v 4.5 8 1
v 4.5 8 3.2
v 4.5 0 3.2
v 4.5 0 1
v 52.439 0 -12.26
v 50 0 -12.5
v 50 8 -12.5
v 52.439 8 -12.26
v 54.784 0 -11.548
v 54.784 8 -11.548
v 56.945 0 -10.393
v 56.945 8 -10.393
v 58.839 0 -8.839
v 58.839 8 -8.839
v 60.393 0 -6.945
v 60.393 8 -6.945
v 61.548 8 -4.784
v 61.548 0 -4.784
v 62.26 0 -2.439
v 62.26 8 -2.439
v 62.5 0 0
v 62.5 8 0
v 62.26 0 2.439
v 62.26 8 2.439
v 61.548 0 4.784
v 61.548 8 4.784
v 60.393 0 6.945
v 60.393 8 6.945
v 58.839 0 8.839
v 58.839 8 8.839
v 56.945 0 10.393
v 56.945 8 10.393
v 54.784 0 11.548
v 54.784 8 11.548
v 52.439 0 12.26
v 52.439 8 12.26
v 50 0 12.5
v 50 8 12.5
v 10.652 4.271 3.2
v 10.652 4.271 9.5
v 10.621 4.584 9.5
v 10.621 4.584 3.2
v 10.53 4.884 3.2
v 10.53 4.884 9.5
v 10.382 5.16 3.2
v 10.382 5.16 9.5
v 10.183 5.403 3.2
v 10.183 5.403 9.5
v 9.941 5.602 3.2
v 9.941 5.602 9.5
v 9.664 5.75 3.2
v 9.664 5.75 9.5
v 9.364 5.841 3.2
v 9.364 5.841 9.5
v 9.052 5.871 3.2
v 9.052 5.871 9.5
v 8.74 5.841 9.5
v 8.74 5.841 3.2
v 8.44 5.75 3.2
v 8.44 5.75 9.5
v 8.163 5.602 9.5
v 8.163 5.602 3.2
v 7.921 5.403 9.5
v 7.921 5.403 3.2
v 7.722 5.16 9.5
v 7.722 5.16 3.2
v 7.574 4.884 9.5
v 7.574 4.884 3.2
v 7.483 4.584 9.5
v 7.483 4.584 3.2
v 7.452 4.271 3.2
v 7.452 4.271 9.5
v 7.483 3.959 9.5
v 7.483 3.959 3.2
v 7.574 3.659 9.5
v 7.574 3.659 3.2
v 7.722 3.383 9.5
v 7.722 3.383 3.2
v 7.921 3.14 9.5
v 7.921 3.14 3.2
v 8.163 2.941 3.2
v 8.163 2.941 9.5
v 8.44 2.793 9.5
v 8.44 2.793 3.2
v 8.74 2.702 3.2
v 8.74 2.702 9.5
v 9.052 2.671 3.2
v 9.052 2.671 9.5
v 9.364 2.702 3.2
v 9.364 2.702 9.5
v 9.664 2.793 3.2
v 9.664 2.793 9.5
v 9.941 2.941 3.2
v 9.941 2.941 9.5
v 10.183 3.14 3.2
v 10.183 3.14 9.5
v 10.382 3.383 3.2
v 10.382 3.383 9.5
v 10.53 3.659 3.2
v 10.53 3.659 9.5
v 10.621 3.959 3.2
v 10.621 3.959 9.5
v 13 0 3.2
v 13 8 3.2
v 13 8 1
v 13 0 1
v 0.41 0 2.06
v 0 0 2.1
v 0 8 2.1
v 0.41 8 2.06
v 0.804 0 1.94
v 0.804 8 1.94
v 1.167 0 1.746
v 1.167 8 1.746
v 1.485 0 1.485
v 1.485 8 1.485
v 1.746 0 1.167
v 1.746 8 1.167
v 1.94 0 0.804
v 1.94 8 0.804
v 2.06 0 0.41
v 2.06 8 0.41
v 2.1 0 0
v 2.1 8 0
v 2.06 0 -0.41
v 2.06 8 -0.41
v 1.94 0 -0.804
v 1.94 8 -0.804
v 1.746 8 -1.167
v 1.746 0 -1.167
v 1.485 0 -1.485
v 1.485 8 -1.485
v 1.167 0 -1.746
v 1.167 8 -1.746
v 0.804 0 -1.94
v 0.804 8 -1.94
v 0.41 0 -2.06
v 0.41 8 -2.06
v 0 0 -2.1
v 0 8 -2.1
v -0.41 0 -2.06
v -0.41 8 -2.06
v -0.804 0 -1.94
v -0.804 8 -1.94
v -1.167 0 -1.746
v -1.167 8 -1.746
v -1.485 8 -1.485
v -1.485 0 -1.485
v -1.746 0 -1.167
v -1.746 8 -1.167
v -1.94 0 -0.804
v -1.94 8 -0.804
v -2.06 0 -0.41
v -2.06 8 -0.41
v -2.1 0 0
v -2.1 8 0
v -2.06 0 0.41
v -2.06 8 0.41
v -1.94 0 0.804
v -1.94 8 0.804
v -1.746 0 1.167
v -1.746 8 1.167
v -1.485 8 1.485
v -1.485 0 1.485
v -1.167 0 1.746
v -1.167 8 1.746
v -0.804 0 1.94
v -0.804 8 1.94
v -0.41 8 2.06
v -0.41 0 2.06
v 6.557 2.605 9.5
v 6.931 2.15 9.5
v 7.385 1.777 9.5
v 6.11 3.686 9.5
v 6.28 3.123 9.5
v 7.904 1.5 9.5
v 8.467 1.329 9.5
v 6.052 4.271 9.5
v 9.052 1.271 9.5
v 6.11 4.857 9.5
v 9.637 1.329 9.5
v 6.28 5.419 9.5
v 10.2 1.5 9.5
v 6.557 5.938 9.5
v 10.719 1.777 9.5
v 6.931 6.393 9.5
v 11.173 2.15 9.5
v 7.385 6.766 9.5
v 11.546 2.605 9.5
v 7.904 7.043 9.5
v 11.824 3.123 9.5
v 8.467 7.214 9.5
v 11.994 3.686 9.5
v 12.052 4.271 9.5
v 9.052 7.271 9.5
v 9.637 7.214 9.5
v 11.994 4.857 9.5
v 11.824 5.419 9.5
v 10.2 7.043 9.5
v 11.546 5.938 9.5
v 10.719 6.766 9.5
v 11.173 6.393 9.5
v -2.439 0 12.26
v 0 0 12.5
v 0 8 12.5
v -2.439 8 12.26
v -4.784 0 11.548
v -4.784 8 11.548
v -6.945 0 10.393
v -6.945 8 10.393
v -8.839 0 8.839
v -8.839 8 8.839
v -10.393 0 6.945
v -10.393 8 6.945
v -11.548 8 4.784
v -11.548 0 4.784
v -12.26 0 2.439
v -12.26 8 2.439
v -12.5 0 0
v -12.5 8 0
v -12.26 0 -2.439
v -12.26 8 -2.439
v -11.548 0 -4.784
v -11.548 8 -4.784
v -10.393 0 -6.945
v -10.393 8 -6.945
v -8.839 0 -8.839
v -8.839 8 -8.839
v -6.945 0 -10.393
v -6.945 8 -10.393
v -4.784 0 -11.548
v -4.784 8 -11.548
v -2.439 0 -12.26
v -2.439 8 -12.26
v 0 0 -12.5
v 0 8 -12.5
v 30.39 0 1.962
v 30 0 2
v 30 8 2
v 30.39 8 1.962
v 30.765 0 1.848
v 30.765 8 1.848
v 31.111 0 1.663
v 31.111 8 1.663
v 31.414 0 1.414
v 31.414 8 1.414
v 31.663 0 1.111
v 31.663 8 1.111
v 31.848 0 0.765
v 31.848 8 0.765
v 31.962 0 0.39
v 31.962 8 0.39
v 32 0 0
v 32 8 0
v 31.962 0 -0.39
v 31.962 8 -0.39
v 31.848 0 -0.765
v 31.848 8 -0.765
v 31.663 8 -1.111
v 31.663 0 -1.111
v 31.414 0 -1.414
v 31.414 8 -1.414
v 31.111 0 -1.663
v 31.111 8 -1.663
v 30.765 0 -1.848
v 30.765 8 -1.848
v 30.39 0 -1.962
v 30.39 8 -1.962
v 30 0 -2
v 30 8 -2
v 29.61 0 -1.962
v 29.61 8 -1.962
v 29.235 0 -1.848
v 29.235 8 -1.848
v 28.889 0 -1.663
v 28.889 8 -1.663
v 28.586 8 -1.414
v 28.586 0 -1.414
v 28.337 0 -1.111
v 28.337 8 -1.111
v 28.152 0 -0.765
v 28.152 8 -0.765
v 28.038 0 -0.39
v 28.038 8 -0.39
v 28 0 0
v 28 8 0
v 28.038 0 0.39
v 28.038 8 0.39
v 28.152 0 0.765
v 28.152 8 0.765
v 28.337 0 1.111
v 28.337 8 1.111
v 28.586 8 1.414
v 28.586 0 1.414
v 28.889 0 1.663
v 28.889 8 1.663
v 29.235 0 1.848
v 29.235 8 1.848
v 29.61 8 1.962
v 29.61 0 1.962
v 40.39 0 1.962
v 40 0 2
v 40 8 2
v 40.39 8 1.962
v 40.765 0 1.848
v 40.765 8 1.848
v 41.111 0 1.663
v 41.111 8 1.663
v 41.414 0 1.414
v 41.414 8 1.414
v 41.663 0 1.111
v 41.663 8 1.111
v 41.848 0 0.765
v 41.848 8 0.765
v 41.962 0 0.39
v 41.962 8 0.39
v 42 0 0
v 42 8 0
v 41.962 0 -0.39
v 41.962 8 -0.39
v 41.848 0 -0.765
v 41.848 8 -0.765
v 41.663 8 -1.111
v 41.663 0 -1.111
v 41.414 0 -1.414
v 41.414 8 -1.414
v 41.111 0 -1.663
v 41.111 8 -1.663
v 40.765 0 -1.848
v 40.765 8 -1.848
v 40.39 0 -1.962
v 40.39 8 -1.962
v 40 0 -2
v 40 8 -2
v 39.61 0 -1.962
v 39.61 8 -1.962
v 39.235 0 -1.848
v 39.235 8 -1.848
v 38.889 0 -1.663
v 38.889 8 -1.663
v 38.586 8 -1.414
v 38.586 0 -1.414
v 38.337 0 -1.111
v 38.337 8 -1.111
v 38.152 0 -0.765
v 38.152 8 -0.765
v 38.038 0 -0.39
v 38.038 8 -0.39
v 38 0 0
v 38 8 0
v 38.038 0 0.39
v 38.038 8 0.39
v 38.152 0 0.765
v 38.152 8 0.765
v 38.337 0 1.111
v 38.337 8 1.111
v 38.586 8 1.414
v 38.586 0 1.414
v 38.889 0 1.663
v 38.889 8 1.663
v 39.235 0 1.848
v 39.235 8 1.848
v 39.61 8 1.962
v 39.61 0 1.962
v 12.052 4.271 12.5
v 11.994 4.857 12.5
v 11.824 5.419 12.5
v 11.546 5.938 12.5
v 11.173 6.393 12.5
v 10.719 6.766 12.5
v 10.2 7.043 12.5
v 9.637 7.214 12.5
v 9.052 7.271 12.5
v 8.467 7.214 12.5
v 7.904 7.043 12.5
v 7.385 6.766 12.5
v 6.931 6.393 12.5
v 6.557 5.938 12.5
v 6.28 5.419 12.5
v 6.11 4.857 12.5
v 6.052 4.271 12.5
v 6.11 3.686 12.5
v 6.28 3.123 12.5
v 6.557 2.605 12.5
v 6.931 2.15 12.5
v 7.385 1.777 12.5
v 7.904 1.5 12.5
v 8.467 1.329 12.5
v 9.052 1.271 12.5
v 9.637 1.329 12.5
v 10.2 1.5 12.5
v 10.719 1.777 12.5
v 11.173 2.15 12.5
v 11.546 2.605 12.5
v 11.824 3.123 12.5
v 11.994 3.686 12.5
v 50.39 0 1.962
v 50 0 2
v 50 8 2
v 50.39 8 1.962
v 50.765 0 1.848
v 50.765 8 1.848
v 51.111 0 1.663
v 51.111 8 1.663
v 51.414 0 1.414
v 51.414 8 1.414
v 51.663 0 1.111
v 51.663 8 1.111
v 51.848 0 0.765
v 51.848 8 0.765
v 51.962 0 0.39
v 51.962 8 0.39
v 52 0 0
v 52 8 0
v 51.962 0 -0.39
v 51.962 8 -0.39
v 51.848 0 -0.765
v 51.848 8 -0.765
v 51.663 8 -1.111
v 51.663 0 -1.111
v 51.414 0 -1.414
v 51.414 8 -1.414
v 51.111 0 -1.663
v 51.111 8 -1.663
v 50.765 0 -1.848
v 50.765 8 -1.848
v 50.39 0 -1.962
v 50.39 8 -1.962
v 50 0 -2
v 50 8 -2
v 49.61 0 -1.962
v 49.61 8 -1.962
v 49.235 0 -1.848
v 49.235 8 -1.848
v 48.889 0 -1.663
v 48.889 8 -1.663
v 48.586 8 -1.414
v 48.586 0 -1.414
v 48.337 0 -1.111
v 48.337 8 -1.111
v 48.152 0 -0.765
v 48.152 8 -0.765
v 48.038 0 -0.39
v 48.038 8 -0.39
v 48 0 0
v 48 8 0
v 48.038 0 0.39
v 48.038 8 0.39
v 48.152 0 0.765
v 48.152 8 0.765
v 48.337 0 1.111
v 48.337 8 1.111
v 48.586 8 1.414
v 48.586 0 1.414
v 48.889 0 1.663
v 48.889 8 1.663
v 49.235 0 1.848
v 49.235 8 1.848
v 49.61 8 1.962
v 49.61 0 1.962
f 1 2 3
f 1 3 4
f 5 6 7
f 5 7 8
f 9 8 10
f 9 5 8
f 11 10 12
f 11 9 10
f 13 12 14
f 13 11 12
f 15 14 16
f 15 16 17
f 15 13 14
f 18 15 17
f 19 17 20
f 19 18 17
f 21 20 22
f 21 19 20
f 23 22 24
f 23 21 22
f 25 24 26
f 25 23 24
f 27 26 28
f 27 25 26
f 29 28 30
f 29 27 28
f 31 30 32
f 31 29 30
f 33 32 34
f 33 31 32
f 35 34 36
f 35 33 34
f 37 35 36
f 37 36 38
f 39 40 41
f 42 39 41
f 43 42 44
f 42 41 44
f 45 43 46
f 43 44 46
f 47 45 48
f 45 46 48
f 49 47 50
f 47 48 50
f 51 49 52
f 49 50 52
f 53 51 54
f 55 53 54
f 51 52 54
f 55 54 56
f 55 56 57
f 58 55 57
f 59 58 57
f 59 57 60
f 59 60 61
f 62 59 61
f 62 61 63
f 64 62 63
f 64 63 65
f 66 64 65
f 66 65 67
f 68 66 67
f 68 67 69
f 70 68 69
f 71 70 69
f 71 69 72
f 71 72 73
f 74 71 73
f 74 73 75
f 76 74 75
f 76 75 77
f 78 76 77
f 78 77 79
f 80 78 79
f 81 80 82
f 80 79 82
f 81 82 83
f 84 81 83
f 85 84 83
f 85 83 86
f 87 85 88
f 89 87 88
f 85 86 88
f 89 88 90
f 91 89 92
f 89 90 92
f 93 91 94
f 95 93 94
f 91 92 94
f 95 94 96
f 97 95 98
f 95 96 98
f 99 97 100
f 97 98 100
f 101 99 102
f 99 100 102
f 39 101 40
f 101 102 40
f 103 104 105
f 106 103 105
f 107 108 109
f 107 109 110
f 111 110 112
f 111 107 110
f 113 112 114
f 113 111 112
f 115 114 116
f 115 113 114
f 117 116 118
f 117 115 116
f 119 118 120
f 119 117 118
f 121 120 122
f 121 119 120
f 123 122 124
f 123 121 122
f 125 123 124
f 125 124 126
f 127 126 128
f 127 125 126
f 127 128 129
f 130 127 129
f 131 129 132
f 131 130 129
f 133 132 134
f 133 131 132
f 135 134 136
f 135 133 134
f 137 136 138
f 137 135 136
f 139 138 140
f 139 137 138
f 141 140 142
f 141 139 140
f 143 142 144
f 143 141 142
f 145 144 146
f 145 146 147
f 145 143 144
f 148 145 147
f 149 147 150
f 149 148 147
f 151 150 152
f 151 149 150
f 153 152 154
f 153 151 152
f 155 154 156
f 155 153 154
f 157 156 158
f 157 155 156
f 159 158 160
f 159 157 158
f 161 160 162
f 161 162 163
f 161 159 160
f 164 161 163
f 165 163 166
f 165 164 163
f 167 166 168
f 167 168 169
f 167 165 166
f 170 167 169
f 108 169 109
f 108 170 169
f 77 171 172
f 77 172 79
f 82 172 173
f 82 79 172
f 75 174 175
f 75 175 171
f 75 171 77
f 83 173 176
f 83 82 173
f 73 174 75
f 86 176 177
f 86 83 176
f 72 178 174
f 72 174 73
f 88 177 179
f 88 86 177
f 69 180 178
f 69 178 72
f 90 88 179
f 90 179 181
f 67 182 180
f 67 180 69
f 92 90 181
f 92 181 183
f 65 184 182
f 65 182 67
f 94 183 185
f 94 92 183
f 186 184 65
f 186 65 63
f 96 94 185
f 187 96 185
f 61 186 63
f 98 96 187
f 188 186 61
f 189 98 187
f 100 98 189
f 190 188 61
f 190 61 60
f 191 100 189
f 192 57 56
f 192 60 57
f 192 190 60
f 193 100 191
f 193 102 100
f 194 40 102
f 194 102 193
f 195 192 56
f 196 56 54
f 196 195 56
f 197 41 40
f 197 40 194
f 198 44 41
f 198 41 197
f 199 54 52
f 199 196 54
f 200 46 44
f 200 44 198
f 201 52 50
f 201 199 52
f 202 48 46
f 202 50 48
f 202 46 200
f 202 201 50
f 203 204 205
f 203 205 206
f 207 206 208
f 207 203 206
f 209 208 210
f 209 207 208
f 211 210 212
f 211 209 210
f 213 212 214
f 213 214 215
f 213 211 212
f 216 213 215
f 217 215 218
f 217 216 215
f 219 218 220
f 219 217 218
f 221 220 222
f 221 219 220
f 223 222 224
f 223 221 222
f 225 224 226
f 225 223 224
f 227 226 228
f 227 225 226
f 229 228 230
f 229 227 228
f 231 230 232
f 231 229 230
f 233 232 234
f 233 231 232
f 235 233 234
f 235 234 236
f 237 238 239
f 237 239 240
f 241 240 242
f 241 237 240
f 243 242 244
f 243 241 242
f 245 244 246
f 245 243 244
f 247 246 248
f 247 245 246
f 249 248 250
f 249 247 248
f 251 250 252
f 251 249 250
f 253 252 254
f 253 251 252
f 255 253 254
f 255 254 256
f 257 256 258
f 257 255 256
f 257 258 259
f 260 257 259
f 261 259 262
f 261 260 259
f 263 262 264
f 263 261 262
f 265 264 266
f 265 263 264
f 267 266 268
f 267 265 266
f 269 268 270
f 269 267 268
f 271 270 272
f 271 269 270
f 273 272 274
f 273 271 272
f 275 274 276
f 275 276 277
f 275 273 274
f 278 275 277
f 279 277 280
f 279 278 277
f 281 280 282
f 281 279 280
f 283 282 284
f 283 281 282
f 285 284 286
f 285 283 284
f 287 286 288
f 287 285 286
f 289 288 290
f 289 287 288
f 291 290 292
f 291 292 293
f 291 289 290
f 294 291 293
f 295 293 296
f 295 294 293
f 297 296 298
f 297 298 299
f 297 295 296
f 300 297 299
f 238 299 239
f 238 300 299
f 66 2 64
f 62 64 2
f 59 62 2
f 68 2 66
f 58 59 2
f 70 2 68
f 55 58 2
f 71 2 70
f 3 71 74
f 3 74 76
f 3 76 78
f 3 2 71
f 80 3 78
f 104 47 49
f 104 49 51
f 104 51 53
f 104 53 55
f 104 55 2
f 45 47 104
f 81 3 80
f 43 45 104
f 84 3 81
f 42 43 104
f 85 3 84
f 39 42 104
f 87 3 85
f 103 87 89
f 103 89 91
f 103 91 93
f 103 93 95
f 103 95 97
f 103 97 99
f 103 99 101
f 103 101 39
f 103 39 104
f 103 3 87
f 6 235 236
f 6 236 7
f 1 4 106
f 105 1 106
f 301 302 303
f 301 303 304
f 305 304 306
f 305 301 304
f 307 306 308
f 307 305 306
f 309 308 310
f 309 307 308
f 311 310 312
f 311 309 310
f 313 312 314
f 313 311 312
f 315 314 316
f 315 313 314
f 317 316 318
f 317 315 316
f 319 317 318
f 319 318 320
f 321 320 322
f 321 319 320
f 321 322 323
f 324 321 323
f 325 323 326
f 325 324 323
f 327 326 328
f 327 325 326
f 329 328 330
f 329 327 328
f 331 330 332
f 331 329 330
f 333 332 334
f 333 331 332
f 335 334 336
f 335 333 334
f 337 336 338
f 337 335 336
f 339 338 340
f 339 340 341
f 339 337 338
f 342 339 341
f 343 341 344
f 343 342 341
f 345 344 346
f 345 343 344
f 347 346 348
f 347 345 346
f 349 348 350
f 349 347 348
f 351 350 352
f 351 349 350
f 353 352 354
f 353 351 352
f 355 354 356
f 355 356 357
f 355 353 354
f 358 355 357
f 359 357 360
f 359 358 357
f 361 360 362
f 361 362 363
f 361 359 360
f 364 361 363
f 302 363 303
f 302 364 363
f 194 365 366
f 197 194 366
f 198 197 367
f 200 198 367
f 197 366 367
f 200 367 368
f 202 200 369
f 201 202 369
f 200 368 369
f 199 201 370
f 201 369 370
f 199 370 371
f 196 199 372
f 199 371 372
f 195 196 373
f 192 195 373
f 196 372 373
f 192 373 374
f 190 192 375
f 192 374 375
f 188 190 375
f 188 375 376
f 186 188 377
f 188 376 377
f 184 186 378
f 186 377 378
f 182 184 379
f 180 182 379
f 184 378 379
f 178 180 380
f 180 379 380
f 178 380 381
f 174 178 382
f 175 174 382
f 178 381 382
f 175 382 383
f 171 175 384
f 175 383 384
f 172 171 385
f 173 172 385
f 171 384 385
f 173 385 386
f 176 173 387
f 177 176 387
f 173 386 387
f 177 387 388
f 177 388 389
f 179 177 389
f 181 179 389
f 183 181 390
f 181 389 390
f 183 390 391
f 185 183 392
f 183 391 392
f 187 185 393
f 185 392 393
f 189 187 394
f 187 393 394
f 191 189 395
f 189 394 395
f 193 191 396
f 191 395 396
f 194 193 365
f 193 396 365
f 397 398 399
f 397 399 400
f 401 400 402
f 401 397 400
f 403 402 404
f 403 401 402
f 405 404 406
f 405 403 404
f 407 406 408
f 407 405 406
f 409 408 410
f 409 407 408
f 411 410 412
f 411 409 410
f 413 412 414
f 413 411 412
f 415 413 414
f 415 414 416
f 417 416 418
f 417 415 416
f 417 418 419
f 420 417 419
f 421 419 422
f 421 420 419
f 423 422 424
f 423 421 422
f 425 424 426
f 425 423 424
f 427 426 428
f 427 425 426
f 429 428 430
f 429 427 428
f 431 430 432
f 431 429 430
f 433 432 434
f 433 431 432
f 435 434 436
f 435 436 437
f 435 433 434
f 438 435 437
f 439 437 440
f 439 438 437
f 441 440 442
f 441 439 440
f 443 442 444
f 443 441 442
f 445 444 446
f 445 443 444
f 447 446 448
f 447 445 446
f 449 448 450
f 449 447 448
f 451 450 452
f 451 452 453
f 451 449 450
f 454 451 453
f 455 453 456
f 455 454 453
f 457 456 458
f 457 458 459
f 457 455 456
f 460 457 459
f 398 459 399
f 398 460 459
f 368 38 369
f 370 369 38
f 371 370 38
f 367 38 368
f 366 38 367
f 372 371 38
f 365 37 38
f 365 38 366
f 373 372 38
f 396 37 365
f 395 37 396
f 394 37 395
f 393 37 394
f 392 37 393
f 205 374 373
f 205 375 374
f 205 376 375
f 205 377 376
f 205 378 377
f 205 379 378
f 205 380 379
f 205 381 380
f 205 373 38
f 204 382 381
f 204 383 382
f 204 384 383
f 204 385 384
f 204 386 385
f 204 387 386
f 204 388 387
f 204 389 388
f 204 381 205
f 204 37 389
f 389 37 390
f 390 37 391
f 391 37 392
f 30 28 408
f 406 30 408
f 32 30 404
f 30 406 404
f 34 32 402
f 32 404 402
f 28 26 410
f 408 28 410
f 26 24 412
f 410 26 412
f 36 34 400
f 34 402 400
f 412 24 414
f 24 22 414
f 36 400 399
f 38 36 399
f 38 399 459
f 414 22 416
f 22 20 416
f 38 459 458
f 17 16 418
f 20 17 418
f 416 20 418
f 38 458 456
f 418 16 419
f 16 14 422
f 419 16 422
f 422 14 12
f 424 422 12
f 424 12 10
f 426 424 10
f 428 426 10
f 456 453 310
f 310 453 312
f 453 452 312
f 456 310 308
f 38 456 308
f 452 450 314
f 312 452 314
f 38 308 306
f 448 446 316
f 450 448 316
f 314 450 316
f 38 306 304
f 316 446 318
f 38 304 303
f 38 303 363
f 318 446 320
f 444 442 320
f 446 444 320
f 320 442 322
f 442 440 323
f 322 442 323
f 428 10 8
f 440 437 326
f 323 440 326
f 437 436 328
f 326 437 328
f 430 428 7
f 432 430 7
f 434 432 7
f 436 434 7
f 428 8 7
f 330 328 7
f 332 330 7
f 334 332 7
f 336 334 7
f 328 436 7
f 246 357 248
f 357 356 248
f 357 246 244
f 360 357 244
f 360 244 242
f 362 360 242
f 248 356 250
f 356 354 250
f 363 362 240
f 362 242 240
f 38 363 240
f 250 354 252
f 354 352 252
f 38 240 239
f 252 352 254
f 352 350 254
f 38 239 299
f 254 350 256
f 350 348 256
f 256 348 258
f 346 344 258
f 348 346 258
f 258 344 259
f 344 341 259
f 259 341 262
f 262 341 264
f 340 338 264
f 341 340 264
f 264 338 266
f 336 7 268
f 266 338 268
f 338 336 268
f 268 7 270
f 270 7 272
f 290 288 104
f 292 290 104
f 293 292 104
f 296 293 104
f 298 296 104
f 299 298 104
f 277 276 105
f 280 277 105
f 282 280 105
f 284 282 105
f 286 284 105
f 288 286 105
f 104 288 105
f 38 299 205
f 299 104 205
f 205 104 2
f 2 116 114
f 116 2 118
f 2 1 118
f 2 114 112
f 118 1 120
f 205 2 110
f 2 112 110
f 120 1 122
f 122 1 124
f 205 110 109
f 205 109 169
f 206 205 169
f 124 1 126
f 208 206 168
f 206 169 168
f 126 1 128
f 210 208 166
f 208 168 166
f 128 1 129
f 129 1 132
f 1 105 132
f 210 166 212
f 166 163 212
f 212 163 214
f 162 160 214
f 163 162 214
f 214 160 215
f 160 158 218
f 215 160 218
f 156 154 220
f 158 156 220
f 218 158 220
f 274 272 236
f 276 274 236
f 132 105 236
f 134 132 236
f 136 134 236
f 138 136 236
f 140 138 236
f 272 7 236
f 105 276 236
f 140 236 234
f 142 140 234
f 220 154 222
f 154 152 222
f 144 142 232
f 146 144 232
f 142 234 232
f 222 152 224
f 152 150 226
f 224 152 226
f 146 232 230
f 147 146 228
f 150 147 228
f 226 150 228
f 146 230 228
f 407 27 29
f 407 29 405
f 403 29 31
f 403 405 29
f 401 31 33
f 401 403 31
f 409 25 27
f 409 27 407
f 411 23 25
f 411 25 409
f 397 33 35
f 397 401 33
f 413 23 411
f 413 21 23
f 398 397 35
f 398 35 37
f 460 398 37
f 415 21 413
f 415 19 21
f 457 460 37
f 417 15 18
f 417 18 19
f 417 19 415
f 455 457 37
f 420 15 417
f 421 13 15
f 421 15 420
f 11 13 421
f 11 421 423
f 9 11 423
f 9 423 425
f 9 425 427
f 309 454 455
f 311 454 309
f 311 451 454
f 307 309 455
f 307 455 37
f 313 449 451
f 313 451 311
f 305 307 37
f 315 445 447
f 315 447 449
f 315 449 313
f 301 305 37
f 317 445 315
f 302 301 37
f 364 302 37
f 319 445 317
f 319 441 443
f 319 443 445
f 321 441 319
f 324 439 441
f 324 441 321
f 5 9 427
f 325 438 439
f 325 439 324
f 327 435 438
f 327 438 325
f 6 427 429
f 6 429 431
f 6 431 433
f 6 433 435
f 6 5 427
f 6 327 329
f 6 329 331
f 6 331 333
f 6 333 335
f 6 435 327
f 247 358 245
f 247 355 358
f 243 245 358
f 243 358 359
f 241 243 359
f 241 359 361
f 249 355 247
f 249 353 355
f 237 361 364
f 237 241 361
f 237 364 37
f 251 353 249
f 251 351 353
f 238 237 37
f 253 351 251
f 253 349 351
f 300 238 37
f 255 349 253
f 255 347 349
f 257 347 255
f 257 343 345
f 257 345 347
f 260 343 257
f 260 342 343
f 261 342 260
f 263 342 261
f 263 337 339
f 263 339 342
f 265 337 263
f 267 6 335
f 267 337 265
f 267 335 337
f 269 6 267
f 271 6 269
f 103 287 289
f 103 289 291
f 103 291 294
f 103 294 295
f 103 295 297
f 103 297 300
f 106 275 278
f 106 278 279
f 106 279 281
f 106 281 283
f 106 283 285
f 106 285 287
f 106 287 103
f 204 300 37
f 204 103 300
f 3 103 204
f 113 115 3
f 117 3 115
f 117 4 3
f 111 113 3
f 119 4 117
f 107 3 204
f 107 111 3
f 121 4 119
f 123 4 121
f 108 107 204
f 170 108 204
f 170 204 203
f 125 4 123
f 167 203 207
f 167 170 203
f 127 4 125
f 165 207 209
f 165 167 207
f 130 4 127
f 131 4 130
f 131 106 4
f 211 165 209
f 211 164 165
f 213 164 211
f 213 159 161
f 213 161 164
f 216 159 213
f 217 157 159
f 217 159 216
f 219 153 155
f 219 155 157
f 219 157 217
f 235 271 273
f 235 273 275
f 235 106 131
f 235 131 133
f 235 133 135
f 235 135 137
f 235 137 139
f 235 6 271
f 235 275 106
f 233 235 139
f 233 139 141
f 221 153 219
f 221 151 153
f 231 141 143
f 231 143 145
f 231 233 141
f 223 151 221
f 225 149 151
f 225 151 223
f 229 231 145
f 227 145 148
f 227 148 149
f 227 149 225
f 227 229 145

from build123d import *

# Parameters (mm, degrees)
SKETCH_1_R          = 2.1
SKETCH_1_R_2        = 2
SKETCH_1_W          = 8.5
SKETCH_1_H          = 2.2
EXTRUDE_1_DEPTH     = 8
CUT_EXTRUDE_START   = -8
SKETCH_2_R          = 2
CUT_EXTRUDE_2_DEPTH = 8
SKETCH_3_R          = 1.6
CUT_EXTRUDE_3_DEPTH = 10
SKETCH_4_R          = 3
CUT_EXTRUDE_4_DEPTH = 3


with BuildPart() as part:
    # 草图1 → 凸台-拉伸1 (new body)
    with BuildSketch(Plane(origin=(0, 0, 0), x_dir=(1, 0, 0), z_dir=(0, 1, 0))):
        with BuildLine():
            Line((0, 12.5), (50, 12.5))
            ThreePointArc((50, 12.5), (62.5, 0), (50, -12.5))
            Line((50, -12.5), (0, -12.5))
            ThreePointArc((0, -12.5), (-12.5, 0), (0, 12.5))
        make_face()
        with Locations(Location((0, 0, 0), (0, 0, 270))):
            Circle(SKETCH_1_R, mode=Mode.SUBTRACT)
        with Locations(Location((50, 0, 0), (0, 0, 270))):
            Circle(SKETCH_1_R_2, mode=Mode.SUBTRACT)
        with Locations((8.75, -2.1)):
            Rectangle(SKETCH_1_W, SKETCH_1_H, mode=Mode.SUBTRACT)
    extrude(amount=EXTRUDE_1_DEPTH)

    # 草图2 → 切除-拉伸2 (cut)
    with BuildSketch(Plane(origin=(0, 8, 0), x_dir=(1, 0, 0), z_dir=(0, 1, 0)).offset(CUT_EXTRUDE_START)):
        with Locations(Location((40, 0, 0), (0, 0, 270))):
            Circle(SKETCH_2_R)
        with Locations(Location((30, 0, 0), (0, 0, 270))):
            Circle(SKETCH_2_R)
        with Locations(Location((50, 0, 0), (0, 0, 270))):
            Circle(SKETCH_2_R)
    extrude(amount=CUT_EXTRUDE_2_DEPTH, mode=Mode.SUBTRACT)

    # 草图3 → 切除-拉伸3 (cut)
    with BuildSketch(Plane.XY.offset(12.5)):
        with Locations((9.051883486, 4.271448274)):
            Circle(SKETCH_3_R)
    extrude(amount=-CUT_EXTRUDE_3_DEPTH, mode=Mode.SUBTRACT)

    # 草图4 → 切除-拉伸4 (cut)
    with BuildSketch(Plane.XY.offset(12.5)):
        with Locations((9.051883486, 4.271448274)):
            Circle(SKETCH_4_R)
    extrude(amount=-CUT_EXTRUDE_4_DEPTH, mode=Mode.SUBTRACT)


solid = part.part
